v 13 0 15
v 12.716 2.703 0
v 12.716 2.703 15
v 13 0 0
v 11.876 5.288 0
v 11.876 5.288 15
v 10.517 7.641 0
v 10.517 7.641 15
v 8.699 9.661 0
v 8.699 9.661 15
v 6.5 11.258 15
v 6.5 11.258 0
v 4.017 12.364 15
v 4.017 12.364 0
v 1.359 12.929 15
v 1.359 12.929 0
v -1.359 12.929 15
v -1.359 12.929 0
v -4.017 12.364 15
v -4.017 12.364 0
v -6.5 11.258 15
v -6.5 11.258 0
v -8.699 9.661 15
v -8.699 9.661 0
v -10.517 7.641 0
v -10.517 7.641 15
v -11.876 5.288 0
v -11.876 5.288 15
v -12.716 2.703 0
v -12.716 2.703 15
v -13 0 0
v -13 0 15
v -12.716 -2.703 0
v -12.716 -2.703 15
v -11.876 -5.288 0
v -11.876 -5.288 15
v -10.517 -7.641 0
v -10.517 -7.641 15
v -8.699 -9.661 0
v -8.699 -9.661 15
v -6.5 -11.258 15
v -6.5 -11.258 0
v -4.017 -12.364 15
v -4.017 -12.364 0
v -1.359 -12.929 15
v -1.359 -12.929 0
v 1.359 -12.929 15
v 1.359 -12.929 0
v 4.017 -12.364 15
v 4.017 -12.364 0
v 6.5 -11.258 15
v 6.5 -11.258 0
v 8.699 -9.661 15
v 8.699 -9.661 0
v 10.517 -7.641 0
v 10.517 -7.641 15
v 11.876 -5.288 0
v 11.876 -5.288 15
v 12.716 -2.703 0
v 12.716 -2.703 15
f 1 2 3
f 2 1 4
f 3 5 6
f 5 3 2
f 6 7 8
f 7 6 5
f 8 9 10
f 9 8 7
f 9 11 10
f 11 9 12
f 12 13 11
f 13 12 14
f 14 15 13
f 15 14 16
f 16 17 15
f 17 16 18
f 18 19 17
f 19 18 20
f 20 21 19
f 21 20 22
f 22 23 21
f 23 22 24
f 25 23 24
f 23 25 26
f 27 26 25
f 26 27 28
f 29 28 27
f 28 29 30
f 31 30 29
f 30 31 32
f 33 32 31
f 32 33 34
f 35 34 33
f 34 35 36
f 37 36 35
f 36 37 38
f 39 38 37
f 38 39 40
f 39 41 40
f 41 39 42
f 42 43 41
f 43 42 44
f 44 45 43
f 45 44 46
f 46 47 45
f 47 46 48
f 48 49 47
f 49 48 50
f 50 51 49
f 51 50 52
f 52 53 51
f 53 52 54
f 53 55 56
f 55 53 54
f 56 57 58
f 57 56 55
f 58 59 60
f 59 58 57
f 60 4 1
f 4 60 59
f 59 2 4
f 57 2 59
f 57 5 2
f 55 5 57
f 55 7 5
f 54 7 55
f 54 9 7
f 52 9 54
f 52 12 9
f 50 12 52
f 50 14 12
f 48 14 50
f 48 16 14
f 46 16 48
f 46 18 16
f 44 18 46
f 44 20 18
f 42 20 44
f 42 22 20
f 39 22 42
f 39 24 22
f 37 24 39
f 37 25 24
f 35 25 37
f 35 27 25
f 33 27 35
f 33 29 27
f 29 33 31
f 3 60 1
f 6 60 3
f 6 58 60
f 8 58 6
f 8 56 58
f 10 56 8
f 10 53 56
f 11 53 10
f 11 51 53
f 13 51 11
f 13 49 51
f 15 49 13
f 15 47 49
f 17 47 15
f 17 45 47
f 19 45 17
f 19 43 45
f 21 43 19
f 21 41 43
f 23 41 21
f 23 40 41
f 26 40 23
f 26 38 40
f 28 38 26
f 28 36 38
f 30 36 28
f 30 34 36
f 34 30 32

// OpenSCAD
// Generated by SolidPython 1.0.1 on 2020-07-29 00:46:44


cylinder(h = 15, r1 = 13, r2 = 13);
/***********************************************
*********      SolidPython code:      **********
************************************************
 
# import packages: SolidPython
from solid import *
from solid.utils import *
from itertools import chain, combinations, permutations


class Resize:

    def __init__(self, scad_file):
        self.scad_file = scad_file
        #self.scad_file = import_scad(scad_file)
        # cone/cylinder param:
        self.r1 = 0
        self.r2 = 0
        self.h = 0
        # rectangular prism param:
        self.w = 0
        self.l = 0
        # ellipse param:
        self.r = 0

    # import OpenScad code (file name corresponds to shape)


    # classify shape + parameters
    def assign(self, param1, param2, param3):
        if self.scad_file == 'cone.scad':
            self.r1 = param1
            self.r2 = param2
            self.h = param3
        elif self.scad_file == 'cylinder.scad':
            self.r1 = param1
            self.r2 = param2
            self.h = param3
        elif self.scad_file == 'rectangularPrism.scad':
            self.h = param1
            self.l = param2
            self.w = param3
        else:
            self.r = param1
            self.h = param2

    # resize parameters
    def iterate(self):
        x = range(3, 20, 2)
        i = 1
        if self.scad_file == 'cone.scad':
            tempList = list(permutations(x, 2))
            for temp in tempList:
                param1 = temp[0]
                param2 = temp[1]
                filepath = 'produced_scad_files/' + 'cone' + str(param1) + '_' + str(param2) + '_' + '.scad'
                scad_render_to_file(cylinder(h=param1, r1=param2, r2=0), filepath)

        elif self.scad_file == 'cylinder.scad':
            tempList = list(permutations(x, 3))
            for temp in tempList:
                param1 = temp[0]
                param2 = temp[1]
                filepath = 'produced_scad_files/' + 'cylinder' + str(param1) + '_' + str(param2) + '_' + '.scad'
                scad_render_to_file(cylinder(h=param1, r1=param2, r2=param2), filepath)

        elif self.scad_file == 'rectangularPrism.scad':
            tempList = list(permutations(x, 3))
            for temp in tempList:
                param1 = temp[0]
                param2 = temp[1]
                param3 = temp[2]
                filepath = 'produced_scad_files/' + 'rectangularPrism' + str(param1) + '_' + str(param2) + '_' + str(
                    param3) + '.scad'
                scad_render_to_file(cube(size=(param1, param2, param3)), filepath)

        elif self.scad_file == 'ellipse.scad':
            tempList = list(permutations(x, 4))
            for temp in tempList:
                param1 = temp[0]
                param2 = temp[1]
                param3 = temp[2]
                param4 = temp[3]
                filepath = 'produced_scad_files/' + 'ellipse' + str(param1) + '_' + str(param2) + '_' + str(param3) + '_' + str(param4) + '.scad'
                scad_render_to_file(scale([param1, param2, param3])(sphere(r=param4)), filepath)

    def render_to_scadfile(self):
        scad_render_to_file(scad, 'example.scad') 
 
************************************************/
